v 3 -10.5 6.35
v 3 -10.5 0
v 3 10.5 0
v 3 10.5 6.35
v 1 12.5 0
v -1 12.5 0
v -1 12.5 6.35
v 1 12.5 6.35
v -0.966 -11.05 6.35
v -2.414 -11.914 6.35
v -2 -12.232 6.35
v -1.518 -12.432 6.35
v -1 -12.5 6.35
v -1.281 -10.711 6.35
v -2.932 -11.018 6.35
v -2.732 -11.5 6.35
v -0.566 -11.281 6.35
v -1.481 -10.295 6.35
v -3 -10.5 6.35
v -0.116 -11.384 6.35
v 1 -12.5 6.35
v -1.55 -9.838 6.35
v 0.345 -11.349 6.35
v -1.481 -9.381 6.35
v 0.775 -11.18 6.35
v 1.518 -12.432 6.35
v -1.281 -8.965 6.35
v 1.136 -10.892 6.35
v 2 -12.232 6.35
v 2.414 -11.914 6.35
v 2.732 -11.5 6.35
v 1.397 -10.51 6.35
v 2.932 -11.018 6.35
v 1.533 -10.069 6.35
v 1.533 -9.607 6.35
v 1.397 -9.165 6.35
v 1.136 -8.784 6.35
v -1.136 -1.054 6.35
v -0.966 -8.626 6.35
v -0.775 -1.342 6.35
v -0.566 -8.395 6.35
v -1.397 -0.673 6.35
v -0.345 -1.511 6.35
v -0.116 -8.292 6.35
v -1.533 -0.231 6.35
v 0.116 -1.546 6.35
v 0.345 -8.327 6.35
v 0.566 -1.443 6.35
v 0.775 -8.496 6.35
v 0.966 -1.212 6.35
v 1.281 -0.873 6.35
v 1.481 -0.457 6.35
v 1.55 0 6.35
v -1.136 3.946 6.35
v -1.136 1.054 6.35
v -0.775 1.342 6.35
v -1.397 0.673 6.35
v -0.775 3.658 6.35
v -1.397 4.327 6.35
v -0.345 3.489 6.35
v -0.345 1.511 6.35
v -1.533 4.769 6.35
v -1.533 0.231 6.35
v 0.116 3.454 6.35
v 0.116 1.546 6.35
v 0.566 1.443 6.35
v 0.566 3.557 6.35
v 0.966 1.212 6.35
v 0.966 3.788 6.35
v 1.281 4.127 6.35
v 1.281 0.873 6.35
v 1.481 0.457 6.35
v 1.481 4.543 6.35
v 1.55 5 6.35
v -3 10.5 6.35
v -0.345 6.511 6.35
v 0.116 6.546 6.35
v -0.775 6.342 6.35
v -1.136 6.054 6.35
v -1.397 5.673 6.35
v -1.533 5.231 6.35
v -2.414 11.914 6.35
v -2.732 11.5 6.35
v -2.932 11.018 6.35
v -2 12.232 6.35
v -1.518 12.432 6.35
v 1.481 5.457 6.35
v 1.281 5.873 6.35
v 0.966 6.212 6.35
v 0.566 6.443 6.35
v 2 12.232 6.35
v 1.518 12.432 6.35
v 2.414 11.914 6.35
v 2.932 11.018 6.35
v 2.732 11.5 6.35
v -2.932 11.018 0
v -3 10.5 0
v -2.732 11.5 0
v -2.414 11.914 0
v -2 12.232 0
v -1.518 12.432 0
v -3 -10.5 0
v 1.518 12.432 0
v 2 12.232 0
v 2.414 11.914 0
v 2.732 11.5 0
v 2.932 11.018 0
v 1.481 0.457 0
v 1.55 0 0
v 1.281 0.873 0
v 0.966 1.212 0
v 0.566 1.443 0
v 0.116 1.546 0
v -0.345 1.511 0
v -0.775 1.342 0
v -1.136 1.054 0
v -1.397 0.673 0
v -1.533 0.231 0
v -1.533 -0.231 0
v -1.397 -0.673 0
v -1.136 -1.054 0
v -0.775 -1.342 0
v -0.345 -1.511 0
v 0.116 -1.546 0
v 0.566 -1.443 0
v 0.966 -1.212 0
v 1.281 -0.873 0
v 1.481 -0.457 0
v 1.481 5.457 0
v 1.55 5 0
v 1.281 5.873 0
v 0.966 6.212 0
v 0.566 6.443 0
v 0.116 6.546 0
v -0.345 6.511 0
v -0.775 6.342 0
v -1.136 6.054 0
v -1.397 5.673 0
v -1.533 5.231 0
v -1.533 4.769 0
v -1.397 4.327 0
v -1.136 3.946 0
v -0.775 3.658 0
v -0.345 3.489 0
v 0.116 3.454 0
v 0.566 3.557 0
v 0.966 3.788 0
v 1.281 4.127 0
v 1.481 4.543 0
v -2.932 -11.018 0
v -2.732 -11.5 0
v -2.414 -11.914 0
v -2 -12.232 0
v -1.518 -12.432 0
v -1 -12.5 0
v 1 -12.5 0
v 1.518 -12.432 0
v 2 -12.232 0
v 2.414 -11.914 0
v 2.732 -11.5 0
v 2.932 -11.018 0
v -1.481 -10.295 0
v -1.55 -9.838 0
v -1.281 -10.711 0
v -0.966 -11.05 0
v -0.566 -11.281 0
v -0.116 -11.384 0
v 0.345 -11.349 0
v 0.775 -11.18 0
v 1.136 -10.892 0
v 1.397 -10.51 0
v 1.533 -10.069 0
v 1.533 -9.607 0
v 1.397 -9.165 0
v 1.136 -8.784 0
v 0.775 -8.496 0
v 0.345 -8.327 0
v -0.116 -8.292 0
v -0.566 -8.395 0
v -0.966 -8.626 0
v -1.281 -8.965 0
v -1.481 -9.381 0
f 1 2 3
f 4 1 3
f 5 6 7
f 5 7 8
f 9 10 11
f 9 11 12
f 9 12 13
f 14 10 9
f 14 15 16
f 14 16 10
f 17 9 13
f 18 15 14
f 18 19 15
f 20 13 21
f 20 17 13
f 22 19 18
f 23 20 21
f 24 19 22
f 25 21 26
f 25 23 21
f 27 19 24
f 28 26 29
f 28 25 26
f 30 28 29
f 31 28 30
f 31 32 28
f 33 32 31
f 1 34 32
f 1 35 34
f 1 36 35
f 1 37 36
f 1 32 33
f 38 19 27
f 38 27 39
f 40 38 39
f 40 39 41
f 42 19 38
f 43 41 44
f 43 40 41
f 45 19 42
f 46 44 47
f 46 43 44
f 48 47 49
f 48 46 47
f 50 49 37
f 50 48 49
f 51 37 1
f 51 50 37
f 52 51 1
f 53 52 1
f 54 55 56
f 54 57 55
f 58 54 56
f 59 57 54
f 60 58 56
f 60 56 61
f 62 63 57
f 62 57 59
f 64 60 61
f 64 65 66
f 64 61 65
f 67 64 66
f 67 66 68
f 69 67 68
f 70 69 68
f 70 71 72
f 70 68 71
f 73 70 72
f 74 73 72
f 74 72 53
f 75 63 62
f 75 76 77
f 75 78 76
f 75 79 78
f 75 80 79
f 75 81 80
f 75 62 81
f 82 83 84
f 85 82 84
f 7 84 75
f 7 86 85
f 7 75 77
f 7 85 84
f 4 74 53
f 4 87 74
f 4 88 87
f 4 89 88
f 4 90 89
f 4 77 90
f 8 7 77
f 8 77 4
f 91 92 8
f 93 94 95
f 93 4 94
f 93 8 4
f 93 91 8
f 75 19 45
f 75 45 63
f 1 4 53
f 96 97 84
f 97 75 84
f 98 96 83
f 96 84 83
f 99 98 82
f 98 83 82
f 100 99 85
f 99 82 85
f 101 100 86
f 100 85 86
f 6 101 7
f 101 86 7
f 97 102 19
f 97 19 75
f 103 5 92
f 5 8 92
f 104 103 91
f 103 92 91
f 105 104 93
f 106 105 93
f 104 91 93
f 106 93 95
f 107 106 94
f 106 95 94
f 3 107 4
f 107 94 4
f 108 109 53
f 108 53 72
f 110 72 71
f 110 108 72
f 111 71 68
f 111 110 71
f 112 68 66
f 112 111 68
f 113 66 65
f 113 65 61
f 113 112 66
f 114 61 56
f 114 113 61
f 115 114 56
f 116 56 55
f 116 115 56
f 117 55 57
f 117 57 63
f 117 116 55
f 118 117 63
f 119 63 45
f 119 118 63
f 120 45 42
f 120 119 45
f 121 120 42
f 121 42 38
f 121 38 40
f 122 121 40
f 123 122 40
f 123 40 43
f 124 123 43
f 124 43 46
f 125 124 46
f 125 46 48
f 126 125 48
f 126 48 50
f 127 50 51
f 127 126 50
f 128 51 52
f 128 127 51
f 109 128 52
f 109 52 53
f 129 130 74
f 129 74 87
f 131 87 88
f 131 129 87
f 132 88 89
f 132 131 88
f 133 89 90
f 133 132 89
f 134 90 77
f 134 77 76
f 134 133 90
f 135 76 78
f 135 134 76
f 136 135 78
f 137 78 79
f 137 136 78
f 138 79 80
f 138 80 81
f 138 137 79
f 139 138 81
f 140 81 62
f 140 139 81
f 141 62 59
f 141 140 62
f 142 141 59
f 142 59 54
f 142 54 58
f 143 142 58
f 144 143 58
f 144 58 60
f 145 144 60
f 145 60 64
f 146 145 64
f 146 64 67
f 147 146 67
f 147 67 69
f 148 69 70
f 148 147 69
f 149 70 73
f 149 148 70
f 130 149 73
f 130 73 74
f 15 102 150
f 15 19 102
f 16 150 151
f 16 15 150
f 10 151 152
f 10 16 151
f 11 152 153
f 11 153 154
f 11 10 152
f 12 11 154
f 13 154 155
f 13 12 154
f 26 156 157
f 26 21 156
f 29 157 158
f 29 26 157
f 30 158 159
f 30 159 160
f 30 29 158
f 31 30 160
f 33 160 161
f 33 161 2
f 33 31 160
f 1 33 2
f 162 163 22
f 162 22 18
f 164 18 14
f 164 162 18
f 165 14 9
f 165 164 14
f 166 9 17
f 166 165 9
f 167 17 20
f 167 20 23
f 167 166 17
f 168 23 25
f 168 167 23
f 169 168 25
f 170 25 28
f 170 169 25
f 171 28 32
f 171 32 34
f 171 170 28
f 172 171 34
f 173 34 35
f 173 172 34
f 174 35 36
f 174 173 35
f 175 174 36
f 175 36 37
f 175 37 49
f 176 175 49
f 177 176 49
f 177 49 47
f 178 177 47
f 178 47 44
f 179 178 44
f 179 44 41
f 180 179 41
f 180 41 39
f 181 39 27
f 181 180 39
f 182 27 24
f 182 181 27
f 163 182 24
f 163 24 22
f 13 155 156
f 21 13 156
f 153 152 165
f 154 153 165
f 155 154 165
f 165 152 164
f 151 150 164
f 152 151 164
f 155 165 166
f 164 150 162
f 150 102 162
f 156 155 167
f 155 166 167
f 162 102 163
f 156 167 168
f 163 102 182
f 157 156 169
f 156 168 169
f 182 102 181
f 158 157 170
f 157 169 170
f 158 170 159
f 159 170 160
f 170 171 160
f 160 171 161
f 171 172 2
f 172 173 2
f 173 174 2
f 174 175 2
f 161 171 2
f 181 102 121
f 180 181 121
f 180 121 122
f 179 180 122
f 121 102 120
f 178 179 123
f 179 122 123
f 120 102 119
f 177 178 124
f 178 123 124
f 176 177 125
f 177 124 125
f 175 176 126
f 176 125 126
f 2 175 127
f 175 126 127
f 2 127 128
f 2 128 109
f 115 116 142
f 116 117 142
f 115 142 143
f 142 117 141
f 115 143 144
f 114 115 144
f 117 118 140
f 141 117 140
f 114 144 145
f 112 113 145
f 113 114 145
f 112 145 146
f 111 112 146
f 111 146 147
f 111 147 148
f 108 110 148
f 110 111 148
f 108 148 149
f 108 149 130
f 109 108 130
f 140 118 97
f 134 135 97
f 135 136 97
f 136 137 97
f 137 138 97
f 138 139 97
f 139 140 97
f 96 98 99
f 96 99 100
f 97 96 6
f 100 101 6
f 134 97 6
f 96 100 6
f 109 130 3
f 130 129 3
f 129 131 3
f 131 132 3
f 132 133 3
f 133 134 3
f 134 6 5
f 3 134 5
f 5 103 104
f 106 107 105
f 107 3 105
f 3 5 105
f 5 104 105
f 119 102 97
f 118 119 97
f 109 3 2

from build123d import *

# Parameters (mm, degrees)
ESQUISSE1_W        = 6
ESQUISSE1_H        = 25
ESQUISSE1_R        = 1.55
BOSS_EXTRU_1_DEPTH = 6.35
CONG_1_R           = 2


with BuildPart() as part:
    # Esquisse1 → Boss.-Extru.1 (new body)
    with BuildSketch(Plane.XY):
        Rectangle(ESQUISSE1_W, ESQUISSE1_H)
        with Locations(Location((0, -9.837865065, 0), (0, 0, 180))):
            Circle(ESQUISSE1_R, mode=Mode.SUBTRACT)
        Circle(ESQUISSE1_R, mode=Mode.SUBTRACT)
        with Locations((0, 5)):
            Circle(ESQUISSE1_R, mode=Mode.SUBTRACT)
    extrude(amount=BOSS_EXTRU_1_DEPTH)

    # Congé1
    cong_1_edges = [part.edges().sort_by_distance(p)[0] for p in [
        (3, -12.5, 3.175),
        (-3, -12.5, 3.175),
        (-3, 12.5, 3.175),
        (3, 12.5, 3.175),
    ]]
    fillet(cong_1_edges, radius=CONG_1_R)


solid = part.part
